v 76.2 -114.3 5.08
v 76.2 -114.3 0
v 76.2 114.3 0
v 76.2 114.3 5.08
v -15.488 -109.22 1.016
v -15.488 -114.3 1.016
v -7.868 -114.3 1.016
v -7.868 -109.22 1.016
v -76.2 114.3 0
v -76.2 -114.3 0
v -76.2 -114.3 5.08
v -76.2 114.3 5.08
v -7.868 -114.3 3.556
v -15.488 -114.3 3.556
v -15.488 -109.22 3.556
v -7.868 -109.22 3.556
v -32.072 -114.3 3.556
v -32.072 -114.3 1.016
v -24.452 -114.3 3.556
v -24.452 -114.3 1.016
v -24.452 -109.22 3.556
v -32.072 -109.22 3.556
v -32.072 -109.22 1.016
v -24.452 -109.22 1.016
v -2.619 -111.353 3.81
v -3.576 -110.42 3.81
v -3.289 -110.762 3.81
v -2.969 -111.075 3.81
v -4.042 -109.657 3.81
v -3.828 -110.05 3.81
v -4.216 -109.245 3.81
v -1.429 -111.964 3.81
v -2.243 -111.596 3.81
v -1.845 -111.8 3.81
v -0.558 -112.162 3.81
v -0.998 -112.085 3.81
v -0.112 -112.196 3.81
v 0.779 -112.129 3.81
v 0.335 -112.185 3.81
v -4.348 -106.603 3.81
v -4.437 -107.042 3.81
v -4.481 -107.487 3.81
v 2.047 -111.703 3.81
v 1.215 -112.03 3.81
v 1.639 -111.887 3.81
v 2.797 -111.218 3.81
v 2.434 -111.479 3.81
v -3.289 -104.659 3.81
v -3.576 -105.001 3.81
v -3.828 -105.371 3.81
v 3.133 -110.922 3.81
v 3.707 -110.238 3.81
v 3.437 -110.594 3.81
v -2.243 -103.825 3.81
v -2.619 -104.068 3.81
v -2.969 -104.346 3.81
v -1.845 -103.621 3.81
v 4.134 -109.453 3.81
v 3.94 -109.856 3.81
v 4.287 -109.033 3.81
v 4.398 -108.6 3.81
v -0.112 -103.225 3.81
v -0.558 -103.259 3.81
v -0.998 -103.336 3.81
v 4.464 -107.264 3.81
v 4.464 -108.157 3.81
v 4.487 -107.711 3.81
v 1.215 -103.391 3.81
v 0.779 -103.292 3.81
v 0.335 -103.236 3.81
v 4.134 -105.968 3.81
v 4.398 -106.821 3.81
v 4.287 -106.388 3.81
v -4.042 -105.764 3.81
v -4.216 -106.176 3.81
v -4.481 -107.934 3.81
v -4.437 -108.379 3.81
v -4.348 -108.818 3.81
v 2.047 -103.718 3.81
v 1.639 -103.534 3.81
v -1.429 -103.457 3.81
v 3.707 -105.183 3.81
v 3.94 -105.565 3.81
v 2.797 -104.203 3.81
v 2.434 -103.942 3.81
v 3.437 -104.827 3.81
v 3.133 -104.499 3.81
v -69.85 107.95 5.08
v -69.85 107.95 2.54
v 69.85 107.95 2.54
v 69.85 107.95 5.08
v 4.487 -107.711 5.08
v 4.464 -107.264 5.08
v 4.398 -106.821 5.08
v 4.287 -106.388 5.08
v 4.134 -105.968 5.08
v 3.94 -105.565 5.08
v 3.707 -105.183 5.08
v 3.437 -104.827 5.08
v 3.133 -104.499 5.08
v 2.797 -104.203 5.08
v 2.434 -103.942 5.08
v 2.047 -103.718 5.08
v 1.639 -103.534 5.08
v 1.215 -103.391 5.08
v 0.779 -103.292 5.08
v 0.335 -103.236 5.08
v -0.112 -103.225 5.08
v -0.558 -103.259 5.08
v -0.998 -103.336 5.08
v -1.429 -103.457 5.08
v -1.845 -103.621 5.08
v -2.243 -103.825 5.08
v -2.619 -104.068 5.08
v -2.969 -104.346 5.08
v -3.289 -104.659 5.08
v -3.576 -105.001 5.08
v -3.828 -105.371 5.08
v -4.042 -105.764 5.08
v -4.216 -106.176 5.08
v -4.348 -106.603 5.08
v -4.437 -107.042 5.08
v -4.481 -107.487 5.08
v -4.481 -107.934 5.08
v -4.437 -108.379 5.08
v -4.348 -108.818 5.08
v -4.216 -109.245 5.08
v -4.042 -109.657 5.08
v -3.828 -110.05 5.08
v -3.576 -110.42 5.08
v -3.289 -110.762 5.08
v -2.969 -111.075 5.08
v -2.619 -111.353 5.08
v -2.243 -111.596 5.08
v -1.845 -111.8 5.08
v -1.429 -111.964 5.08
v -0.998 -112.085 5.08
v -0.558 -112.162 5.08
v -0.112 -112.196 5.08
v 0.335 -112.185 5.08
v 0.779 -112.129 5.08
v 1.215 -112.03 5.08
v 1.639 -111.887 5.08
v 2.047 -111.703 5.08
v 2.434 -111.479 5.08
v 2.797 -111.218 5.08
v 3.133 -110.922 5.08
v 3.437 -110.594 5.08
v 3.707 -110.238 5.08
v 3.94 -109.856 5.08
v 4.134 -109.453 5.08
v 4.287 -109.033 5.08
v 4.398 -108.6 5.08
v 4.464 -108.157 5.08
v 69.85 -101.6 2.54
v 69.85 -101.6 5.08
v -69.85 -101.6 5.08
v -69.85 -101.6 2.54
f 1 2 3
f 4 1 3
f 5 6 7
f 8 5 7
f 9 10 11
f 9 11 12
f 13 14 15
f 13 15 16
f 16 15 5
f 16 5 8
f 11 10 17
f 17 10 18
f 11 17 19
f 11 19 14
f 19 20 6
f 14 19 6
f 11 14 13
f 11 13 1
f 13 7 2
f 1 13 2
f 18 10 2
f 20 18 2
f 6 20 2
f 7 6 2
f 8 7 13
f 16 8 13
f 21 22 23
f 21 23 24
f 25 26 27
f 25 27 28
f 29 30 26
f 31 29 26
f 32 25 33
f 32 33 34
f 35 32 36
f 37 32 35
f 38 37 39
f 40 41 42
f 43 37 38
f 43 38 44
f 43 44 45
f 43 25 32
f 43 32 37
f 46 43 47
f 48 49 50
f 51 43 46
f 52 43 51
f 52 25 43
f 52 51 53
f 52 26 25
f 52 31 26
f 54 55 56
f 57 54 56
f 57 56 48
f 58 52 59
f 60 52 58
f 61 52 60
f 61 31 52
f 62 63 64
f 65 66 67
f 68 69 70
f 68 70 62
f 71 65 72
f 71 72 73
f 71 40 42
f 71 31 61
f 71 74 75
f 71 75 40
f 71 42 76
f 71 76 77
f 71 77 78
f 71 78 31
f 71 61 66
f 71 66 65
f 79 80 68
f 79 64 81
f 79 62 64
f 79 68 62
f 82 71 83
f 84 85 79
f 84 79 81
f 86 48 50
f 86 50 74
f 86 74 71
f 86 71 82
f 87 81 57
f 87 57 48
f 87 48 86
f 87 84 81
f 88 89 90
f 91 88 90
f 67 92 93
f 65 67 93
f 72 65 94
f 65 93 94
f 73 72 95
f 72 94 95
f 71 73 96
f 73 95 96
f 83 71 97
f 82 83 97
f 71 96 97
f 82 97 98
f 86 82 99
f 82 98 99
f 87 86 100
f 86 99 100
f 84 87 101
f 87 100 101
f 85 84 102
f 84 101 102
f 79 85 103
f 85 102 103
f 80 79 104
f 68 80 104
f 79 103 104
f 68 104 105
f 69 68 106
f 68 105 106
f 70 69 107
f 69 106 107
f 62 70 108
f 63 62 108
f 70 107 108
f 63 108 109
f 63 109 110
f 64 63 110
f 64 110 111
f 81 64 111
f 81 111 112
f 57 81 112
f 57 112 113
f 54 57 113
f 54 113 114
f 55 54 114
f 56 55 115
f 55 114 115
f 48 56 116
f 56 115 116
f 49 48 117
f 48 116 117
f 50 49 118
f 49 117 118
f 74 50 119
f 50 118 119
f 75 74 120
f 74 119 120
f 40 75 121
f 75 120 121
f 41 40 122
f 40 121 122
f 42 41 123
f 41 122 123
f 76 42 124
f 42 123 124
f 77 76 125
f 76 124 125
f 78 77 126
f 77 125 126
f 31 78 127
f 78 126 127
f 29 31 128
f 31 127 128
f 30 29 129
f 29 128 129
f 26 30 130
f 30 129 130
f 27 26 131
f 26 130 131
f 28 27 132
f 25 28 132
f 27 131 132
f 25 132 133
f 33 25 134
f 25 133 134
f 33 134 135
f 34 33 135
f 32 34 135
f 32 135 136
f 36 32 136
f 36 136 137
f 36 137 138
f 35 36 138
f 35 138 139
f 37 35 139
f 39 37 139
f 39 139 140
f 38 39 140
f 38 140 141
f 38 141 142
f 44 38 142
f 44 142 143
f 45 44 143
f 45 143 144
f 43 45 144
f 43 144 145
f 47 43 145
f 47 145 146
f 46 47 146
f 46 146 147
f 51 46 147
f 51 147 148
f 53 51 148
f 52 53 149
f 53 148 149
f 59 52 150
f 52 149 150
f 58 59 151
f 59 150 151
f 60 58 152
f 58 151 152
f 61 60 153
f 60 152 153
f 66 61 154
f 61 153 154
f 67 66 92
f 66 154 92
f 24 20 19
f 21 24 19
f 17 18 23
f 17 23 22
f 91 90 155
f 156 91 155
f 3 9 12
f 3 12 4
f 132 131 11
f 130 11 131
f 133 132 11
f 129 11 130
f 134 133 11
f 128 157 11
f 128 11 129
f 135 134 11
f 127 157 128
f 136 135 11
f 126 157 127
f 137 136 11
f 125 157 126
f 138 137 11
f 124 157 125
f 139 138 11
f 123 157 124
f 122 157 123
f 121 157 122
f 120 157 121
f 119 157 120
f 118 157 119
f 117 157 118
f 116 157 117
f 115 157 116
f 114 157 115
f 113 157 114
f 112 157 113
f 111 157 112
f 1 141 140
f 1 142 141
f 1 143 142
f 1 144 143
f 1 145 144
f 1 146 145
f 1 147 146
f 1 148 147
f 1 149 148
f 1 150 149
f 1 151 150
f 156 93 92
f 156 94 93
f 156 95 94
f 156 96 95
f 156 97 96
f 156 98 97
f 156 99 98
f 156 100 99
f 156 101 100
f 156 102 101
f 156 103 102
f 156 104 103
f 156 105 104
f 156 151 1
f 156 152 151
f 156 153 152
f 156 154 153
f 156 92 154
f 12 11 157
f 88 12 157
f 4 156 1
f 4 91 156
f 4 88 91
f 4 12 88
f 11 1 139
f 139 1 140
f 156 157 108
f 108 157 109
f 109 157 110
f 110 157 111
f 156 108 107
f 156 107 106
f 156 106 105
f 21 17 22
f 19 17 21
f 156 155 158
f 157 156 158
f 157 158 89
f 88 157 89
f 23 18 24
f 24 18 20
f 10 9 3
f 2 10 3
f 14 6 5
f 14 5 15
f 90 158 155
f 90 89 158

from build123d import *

# Parameters (mm, degrees)
F0_W     = 152.4
F0_H     = 228.6
F1_DEPTH = 5.08
F2_DEPTH = 2.54
F3_R     = 4.486697
F4_DEPTH = 1.27
F5_W     = 7.62
F5_H     = 2.54
F6_DEPTH = 5.08


with BuildPart() as f1:
    # F0 (on Top) → F1 (new body)
    with BuildSketch(Plane.XY):
        Rectangle(F0_W, F0_H)
        Polygon((69.85, -101.6), (-69.85, -101.6), (-69.85, 101.6), (-69.85, 107.95), (69.85, 107.95), (69.85, 101.6), align=None, mode=Mode.SUBTRACT)
    extrude(amount=F1_DEPTH)

    # F0 (on Top) → F2 (join)
    with BuildSketch(Plane.XY):
        Polygon((-69.85, 101.6), (-69.85, -101.6), (69.85, -101.6), (69.85, 101.6), (69.85, 107.95), (-69.85, 107.95), align=None)
    extrude(amount=F2_DEPTH)

    # F3 (on face) → F4 (cut)
    with BuildSketch(Plane.XY.offset(5.08)):
        with Locations((0, -107.710503)):
            Circle(F3_R)
    extrude(amount=-F4_DEPTH, mode=Mode.SUBTRACT)

    # F5 (on face) → F6 (cut)
    with BuildSketch(Plane.XZ.offset(114.3)):
        with Locations((-28.262435, 2.286)):
            Rectangle(F5_W, F5_H)
        with Locations((-11.677729, 2.286)):
            Rectangle(F5_W, F5_H)
    extrude(amount=-F6_DEPTH, mode=Mode.SUBTRACT)


solid = f1.part
